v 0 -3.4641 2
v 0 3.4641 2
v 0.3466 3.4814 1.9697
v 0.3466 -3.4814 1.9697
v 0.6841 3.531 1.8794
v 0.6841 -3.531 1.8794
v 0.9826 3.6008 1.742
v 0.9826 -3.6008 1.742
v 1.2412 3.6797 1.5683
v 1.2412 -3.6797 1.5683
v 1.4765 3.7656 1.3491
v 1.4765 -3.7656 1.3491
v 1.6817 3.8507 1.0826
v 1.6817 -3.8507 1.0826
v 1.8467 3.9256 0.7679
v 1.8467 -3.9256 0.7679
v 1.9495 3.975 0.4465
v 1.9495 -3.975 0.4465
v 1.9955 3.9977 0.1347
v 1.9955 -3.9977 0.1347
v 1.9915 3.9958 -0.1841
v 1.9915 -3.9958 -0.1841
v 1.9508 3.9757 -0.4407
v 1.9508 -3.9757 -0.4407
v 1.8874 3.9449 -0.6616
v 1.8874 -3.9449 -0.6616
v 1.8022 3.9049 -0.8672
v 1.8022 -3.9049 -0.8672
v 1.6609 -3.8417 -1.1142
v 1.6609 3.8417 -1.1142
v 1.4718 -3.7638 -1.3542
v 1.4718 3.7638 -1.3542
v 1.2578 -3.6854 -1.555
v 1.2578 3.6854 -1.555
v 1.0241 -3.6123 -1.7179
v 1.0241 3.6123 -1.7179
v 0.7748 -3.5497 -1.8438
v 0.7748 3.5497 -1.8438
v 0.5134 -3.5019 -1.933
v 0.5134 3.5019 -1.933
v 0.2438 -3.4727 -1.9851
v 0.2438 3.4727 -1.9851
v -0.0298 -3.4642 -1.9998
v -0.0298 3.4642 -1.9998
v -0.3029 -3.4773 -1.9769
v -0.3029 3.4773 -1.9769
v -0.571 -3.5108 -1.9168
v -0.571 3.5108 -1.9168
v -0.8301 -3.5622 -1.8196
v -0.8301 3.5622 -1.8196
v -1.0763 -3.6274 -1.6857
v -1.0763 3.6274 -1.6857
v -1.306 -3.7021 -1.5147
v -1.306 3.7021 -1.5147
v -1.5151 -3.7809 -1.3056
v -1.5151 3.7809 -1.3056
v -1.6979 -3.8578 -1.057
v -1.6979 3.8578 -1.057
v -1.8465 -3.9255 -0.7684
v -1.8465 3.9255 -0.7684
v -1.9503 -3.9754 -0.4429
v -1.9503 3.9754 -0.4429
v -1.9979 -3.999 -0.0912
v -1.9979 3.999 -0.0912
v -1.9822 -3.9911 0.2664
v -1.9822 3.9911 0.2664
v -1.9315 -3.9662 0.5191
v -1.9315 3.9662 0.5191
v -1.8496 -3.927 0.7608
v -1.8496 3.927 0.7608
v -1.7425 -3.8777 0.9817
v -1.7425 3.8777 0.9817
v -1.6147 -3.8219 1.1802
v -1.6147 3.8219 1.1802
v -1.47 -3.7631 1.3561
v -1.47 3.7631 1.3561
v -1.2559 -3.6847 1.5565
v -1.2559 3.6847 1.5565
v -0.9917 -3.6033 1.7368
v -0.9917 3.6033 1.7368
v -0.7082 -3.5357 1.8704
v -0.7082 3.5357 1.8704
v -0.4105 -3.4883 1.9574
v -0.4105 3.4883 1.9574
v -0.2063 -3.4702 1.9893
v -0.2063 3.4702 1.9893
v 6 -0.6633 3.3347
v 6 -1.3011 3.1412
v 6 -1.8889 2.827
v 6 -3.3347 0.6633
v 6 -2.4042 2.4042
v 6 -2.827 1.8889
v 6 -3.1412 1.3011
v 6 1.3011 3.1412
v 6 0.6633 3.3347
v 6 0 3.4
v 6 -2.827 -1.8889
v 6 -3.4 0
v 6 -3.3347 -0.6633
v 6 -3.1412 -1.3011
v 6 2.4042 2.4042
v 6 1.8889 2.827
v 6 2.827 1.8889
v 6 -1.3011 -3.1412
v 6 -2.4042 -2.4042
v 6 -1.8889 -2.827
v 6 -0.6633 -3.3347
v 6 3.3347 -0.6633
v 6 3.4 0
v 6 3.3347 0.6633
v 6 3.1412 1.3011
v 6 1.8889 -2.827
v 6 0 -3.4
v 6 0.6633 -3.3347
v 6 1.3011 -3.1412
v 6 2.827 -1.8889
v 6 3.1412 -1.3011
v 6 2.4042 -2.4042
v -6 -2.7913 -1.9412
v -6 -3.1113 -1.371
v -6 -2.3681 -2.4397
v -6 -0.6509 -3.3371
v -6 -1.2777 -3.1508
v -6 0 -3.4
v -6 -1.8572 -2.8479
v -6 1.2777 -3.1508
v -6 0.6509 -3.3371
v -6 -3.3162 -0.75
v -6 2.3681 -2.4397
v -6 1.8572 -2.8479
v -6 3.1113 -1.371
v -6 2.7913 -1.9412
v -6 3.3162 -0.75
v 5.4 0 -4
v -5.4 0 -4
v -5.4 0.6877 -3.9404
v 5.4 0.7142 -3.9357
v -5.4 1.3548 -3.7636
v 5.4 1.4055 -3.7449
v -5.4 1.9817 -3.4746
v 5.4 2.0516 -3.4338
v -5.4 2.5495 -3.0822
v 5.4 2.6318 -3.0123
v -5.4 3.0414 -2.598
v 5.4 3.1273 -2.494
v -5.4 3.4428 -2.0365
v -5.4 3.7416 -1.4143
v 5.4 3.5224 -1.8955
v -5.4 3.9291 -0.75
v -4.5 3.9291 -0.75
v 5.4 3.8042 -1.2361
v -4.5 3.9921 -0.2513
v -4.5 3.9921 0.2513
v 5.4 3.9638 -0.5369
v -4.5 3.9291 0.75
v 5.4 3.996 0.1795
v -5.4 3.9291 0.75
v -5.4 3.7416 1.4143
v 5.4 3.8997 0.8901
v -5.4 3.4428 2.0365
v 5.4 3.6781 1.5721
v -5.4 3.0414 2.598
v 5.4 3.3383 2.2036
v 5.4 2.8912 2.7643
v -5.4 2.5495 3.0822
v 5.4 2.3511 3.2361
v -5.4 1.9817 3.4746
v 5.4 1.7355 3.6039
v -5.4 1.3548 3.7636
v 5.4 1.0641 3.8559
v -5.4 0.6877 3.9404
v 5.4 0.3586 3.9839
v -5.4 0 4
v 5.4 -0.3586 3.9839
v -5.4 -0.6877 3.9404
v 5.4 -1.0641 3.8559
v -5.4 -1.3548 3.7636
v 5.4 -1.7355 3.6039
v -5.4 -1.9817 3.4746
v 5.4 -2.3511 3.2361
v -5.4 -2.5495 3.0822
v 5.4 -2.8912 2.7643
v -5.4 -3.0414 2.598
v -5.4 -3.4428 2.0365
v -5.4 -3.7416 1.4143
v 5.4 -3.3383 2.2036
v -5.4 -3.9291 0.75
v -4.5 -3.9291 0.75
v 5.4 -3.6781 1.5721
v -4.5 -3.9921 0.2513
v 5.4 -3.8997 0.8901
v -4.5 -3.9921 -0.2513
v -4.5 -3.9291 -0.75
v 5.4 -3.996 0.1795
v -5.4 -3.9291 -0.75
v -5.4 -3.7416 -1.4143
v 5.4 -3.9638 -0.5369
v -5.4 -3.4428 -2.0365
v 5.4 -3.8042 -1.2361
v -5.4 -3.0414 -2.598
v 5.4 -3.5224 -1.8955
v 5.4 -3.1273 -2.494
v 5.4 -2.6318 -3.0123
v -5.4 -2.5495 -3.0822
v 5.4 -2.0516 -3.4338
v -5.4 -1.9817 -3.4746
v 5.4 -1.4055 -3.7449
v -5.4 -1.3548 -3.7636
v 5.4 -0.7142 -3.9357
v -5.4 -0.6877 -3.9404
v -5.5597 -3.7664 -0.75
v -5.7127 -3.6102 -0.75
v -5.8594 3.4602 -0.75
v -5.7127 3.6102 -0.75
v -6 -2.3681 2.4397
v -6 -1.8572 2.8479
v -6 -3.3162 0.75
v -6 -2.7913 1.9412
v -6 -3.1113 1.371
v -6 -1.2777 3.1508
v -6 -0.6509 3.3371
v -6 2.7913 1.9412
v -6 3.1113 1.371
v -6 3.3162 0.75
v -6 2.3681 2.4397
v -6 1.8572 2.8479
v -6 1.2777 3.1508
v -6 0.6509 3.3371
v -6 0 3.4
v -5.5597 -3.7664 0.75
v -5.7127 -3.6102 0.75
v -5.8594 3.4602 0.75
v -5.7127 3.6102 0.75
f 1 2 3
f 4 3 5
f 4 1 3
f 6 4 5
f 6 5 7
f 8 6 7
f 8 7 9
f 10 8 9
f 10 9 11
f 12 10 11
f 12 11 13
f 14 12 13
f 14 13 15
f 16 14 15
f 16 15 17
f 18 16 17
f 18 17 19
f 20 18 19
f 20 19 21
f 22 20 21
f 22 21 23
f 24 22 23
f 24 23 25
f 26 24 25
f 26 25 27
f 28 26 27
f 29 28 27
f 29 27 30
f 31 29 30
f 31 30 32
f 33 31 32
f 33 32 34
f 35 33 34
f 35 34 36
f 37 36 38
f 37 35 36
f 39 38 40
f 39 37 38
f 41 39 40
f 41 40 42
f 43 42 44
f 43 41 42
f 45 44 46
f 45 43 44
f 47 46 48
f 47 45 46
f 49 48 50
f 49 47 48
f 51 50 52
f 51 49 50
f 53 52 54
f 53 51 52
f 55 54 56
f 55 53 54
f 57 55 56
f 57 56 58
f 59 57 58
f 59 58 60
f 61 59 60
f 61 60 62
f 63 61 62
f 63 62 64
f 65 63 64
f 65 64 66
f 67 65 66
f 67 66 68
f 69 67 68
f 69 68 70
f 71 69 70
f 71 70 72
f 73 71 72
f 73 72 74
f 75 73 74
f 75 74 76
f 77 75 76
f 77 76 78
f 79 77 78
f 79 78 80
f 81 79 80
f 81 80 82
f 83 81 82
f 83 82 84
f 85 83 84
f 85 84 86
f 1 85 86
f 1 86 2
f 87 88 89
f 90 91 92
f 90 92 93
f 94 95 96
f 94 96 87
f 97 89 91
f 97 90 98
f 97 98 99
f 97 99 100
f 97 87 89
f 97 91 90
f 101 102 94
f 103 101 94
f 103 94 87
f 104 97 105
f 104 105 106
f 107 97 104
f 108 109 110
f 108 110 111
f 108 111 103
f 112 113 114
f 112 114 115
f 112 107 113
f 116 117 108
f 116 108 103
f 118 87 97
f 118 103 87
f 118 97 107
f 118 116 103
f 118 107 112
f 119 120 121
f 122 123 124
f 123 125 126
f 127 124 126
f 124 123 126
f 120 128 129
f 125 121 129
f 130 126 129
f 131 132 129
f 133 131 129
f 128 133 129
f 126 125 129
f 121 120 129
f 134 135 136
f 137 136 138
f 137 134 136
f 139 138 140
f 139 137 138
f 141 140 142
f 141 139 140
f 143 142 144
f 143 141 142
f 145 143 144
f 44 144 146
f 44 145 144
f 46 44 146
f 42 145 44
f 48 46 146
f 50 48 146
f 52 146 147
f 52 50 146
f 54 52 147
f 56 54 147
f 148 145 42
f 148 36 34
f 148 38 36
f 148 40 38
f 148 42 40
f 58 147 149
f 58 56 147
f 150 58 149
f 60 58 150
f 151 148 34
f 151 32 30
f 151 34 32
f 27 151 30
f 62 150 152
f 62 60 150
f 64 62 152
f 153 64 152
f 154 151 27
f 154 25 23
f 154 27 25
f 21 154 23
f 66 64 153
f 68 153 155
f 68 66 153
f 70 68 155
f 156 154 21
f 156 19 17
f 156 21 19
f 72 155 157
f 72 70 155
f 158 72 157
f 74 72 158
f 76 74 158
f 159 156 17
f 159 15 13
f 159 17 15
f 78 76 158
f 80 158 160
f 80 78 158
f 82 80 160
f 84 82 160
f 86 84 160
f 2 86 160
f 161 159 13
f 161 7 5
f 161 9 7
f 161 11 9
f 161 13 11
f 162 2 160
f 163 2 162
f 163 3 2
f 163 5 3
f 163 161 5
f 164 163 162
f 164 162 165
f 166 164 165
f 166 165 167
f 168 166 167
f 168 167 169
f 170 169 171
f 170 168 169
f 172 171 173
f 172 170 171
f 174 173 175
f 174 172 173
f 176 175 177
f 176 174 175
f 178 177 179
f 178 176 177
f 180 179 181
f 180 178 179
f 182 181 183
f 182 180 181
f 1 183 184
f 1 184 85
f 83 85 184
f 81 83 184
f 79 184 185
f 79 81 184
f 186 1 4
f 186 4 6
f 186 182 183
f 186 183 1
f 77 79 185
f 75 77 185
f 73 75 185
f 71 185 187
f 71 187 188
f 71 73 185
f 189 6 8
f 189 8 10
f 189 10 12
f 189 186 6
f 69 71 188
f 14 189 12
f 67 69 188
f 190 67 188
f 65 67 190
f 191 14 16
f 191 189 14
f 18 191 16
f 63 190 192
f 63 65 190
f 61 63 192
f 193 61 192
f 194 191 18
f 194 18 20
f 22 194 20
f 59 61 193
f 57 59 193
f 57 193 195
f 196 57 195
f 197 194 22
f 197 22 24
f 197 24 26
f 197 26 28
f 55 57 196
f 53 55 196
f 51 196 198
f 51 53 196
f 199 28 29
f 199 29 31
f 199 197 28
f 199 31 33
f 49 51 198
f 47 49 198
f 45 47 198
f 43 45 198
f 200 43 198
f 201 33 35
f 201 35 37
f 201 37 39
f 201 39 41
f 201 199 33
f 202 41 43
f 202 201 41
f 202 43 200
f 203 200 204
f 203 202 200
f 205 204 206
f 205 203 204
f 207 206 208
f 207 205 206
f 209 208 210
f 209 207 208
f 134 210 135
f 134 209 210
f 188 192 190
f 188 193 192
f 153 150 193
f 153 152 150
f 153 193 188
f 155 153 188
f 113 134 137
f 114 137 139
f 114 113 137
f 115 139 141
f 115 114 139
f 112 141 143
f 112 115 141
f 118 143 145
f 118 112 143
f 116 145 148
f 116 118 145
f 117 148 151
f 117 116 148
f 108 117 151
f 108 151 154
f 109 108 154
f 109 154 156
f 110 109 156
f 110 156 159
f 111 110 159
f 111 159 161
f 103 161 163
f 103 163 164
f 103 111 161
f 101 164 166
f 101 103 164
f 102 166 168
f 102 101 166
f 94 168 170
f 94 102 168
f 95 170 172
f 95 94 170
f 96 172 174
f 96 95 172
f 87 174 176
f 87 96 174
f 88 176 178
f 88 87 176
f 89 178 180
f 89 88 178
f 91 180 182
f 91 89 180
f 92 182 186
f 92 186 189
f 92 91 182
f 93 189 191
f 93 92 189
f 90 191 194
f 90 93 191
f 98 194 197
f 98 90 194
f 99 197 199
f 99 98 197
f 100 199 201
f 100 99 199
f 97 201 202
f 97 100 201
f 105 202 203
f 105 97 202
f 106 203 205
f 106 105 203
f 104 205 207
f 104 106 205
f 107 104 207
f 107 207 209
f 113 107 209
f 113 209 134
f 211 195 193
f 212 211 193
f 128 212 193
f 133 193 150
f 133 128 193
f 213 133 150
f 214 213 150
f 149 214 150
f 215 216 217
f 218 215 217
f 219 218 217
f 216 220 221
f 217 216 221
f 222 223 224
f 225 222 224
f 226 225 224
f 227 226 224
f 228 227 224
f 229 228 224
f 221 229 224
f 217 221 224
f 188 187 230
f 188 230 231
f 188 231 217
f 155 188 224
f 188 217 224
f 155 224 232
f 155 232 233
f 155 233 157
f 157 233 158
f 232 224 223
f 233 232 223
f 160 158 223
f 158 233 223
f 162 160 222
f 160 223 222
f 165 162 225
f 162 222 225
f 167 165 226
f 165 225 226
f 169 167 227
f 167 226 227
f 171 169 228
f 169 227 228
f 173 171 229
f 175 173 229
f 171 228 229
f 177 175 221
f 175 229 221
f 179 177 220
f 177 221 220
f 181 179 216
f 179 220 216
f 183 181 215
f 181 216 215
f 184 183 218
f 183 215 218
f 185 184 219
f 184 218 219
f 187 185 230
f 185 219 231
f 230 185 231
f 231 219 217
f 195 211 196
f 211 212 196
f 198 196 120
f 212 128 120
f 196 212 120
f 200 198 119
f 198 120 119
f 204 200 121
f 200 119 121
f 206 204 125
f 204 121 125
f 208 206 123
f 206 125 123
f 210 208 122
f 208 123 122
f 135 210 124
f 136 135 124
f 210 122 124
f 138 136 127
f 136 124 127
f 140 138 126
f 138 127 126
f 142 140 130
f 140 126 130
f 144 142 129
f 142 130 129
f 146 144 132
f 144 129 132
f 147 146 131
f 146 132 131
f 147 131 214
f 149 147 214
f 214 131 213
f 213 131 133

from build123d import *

# Parameters (mm, degrees)
SKETCH1_R               = 4
BOSS_EXTRUDE1_DEPTH     = 6
CHAMFER1_SIZE           = 0.6
CUT_EXTRUDE1_DEPTH      = 9.246211251
CUT_EXTRUDE1_DEPTH_BACK = 9.246211251
SKETCH2_R               = 2
SKETCH3_W               = 1.5
SKETCH3_H               = 10.178727068
CUT_EXTRUDE2_DEPTH      = 1.5


with BuildPart() as part:
    # Sketch1 → Boss-Extrude1 (new, symmetric)
    with BuildSketch(Plane(origin=(0, 0, 0), x_dir=(0, 0, -1), z_dir=(1, 0, 0))):
        Circle(SKETCH1_R)
    extrude(amount=BOSS_EXTRUDE1_DEPTH, both=True)

    # Chamfer1
    chamfer1_edges = [part.edges().sort_by_distance(p)[0] for p in [
        (-6, 0, 4),
        (6, 0, 4),
    ]]
    chamfer(chamfer1_edges, length=CHAMFER1_SIZE)

    # Sketch2 → Cut-Extrude1 (cut, two sides: drawn at the far end of the back side and taken through both)
    with BuildSketch(Plane(origin=(0, 0, 0), x_dir=(1, 0, 0), z_dir=(0, 1, 0)).offset(-CUT_EXTRUDE1_DEPTH_BACK)):
        with Locations(Location((0, 0, 0), (0, 0, 270))):
            Circle(SKETCH2_R)
    extrude(amount=CUT_EXTRUDE1_DEPTH + CUT_EXTRUDE1_DEPTH_BACK, mode=Mode.SUBTRACT)

    # Sketch3 → Cut-Extrude2 (cut)
    with BuildSketch(Plane.ZY.offset(6)):
        Rectangle(SKETCH3_W, SKETCH3_H)
    extrude(amount=-CUT_EXTRUDE2_DEPTH, mode=Mode.SUBTRACT)


solid = part.part
